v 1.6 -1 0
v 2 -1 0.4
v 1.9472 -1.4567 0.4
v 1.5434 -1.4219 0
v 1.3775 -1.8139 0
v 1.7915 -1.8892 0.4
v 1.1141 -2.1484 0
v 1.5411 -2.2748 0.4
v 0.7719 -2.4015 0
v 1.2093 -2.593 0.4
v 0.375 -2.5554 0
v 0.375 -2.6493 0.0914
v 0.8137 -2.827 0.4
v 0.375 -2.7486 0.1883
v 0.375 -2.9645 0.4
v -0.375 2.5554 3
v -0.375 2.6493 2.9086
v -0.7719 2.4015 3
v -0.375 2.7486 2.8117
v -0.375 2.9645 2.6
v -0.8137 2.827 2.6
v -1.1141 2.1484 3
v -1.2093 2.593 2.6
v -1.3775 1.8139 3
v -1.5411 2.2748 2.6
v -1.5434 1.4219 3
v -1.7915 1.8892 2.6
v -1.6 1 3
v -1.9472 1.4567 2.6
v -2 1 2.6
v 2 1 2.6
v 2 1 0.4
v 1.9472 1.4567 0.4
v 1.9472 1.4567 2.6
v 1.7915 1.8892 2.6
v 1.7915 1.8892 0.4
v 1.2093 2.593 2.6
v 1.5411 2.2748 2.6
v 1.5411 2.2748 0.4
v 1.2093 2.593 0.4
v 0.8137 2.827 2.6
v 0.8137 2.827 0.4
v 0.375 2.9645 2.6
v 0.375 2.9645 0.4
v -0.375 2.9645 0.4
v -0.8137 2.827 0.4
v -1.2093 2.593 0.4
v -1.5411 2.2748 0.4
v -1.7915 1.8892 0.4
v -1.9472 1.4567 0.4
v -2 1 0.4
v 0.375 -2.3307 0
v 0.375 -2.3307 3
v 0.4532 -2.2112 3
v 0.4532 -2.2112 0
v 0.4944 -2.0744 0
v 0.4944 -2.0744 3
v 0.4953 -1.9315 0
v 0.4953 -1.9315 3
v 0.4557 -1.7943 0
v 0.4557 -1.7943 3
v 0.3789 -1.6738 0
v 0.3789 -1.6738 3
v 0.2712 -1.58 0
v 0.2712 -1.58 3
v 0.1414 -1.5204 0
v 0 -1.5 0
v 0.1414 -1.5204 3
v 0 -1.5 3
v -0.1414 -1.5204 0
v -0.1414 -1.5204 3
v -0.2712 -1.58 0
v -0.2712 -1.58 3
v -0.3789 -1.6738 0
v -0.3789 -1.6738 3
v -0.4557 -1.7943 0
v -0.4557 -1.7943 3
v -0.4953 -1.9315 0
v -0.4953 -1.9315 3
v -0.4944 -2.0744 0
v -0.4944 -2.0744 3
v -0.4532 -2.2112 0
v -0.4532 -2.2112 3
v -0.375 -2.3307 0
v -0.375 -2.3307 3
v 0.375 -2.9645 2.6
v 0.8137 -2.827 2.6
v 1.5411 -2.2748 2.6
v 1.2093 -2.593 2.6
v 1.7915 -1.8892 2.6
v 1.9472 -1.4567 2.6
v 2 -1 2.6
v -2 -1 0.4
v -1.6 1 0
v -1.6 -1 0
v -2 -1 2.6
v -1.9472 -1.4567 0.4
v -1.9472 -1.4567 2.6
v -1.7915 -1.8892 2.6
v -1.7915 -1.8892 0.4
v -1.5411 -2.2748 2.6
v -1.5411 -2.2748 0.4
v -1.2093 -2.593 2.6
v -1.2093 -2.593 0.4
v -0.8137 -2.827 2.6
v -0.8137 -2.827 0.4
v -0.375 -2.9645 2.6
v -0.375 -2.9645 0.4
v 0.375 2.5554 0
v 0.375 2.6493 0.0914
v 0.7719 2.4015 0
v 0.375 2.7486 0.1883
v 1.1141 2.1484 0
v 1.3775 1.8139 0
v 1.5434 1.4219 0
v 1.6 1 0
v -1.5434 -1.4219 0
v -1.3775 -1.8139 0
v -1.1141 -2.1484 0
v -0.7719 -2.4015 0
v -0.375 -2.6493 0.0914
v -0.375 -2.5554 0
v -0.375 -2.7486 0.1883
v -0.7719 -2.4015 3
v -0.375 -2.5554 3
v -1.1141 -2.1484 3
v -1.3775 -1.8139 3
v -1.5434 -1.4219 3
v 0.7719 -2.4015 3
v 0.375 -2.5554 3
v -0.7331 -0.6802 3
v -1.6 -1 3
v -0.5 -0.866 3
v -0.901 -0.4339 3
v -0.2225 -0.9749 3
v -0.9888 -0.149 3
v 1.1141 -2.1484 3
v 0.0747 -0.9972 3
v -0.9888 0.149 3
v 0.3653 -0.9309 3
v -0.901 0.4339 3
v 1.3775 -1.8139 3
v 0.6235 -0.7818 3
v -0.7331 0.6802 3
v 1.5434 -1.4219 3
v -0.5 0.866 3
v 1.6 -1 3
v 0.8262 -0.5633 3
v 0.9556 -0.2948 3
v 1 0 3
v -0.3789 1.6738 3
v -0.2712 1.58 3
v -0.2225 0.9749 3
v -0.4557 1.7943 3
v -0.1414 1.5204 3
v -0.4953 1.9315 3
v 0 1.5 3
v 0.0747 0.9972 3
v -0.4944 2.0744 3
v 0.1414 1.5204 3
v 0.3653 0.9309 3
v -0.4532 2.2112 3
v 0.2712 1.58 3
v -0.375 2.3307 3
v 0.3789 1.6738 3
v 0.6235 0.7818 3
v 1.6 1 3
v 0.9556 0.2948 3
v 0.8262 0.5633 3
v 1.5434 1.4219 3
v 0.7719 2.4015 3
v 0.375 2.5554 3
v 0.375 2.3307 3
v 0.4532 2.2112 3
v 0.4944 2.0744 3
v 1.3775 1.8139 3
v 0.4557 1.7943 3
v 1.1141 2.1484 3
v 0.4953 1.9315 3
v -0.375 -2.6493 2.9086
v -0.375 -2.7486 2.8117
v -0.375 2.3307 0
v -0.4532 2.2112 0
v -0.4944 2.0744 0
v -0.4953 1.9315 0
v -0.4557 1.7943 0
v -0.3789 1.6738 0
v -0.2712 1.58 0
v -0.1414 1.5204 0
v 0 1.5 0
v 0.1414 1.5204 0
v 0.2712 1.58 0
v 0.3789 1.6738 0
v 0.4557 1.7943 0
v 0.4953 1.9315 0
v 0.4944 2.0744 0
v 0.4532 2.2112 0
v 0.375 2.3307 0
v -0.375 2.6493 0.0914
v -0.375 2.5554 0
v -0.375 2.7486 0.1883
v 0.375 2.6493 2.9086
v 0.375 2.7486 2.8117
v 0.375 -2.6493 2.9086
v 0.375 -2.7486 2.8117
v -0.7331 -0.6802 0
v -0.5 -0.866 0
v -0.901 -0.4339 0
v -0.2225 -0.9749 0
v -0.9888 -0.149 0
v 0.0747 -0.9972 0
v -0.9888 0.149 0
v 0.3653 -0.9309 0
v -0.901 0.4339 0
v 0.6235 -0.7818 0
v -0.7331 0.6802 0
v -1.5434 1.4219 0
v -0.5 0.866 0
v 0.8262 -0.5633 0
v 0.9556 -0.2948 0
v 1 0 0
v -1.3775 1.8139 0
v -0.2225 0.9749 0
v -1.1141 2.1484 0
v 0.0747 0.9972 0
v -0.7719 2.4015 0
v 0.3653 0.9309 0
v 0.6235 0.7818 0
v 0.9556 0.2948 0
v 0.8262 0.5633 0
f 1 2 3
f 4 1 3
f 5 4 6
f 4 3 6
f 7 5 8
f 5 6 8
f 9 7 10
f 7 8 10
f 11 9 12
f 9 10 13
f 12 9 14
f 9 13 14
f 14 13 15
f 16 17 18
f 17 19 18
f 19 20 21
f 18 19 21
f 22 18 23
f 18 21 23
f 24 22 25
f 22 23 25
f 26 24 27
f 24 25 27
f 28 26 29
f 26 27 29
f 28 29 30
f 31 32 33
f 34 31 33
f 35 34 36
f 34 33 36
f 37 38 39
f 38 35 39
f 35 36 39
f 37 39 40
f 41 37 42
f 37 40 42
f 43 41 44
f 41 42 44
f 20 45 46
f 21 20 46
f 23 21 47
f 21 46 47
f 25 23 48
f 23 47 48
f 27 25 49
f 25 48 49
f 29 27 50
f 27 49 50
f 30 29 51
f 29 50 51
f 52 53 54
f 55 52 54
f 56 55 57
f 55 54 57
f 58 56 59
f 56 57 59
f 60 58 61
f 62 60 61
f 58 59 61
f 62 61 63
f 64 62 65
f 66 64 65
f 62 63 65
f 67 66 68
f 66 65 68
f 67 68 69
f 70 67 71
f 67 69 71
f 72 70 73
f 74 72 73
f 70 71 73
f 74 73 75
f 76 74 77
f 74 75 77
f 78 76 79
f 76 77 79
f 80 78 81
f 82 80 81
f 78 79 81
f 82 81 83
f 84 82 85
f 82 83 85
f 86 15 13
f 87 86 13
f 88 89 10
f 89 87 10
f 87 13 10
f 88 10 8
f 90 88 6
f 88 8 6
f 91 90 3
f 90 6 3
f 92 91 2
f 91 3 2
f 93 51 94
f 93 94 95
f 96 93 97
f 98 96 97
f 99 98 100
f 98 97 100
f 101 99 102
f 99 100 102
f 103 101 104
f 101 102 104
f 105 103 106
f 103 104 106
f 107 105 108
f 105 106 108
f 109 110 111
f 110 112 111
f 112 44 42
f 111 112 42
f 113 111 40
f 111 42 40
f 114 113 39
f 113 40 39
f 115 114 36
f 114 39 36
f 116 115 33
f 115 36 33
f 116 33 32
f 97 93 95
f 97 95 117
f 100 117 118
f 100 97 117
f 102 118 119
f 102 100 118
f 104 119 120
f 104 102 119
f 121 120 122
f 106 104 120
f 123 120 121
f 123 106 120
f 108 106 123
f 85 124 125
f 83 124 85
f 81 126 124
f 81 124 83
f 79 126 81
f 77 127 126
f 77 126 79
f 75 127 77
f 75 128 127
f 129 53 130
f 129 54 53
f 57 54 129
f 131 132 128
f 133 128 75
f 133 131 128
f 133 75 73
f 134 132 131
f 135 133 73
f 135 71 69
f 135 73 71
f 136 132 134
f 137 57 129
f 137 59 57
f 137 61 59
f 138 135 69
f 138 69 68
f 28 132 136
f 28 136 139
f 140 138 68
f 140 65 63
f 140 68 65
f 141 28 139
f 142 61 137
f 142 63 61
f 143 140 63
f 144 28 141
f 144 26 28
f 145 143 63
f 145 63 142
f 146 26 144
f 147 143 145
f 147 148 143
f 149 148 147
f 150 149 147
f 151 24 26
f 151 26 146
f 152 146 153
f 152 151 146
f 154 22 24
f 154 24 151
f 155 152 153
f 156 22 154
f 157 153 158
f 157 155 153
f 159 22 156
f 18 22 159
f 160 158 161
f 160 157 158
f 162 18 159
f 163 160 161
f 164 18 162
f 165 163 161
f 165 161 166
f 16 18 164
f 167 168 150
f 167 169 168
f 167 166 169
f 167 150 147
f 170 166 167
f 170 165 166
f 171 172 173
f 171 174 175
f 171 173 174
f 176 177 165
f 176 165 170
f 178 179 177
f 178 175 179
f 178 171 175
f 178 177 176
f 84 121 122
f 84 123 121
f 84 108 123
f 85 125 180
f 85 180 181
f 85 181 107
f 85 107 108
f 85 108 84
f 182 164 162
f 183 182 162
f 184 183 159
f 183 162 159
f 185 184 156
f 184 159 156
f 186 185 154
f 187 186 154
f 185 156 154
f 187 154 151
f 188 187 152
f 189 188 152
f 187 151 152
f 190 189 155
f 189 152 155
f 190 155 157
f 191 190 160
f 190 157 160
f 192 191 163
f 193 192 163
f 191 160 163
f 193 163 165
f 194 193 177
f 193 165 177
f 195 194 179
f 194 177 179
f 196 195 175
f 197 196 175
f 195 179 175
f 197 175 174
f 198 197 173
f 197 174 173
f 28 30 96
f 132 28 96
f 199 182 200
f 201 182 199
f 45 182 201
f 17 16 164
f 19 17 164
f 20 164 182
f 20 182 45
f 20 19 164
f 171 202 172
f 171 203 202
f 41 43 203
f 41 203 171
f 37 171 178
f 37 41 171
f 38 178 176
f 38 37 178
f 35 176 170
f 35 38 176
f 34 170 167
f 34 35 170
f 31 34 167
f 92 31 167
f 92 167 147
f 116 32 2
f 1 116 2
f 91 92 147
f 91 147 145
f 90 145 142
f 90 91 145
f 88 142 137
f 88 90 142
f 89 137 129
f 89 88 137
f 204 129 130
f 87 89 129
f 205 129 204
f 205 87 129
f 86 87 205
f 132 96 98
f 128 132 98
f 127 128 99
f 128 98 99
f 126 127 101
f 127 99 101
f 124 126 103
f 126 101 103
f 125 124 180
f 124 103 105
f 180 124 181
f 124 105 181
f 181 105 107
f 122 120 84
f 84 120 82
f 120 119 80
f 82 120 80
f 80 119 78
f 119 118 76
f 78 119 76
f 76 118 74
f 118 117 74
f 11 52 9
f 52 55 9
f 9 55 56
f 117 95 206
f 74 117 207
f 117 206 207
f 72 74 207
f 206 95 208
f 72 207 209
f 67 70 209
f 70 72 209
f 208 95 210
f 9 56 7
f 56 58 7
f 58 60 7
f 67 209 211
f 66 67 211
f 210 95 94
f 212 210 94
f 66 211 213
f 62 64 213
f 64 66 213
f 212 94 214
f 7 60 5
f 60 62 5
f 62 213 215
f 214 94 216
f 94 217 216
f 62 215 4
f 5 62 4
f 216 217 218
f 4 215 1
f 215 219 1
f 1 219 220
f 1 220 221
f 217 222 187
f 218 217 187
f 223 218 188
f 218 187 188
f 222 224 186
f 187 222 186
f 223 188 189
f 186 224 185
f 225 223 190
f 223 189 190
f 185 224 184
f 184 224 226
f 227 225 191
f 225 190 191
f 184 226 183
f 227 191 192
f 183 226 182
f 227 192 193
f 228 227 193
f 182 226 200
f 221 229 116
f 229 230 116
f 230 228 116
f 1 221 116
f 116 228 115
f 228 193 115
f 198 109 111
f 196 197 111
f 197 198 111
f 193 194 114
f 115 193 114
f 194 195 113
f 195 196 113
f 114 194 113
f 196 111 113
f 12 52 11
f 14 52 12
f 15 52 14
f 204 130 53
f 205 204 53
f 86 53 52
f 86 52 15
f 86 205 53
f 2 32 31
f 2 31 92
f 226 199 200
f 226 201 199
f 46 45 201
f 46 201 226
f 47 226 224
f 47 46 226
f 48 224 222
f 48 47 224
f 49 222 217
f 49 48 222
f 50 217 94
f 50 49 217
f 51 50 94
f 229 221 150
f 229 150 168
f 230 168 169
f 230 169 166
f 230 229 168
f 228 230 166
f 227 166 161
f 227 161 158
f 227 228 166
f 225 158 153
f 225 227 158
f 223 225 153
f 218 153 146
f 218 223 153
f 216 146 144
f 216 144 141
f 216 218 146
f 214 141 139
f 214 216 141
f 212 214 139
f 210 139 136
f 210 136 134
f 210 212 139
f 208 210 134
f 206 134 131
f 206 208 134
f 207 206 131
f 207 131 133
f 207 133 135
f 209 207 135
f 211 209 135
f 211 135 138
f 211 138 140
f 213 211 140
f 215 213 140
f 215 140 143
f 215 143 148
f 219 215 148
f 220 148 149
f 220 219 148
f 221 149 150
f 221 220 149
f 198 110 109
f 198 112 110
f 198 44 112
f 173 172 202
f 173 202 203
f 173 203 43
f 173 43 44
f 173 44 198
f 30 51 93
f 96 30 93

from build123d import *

# Parameters (mm, degrees)
SKETCH_R           = 1
PAD_DEPTH          = 3
POCKET_DEPTH       = 18.621499
POLARPATTERN_COUNT = 2
CHAMFER_SIZE       = 0.4


with BuildPart() as part:
    # Sketch (on XY_Plane of Origin) → Pad (new body)
    with BuildSketch(Plane.XY):
        with BuildLine():
            ThreePointArc((2, 1), (0, 3), (-2, 1))
            Line((-2, 1), (-2, -1))
            ThreePointArc((-2, -1), (0, -3), (2, -1))
            Line((2, 1), (2, -1))
        make_face()
        Circle(SKETCH_R, mode=Mode.SUBTRACT)
    extrude(amount=PAD_DEPTH)

    # Sketch001 (on Face7 of Pad) → Pocket (cut, through all)
    with BuildSketch(Plane.XY.offset(3)):
        with BuildLine():
            ThreePointArc((-0.375, 2.330719), (0, 1.5), (0.375, 2.330719))
            Line((0.375, 4.330719), (0.375, 2.330719))
            Line((-0.375, 4.330719), (0.375, 4.330719))
            Line((-0.375, 2.330719), (-0.375, 4.330719))
        make_face()
    pocket = extrude(amount=-POCKET_DEPTH, mode=Mode.SUBTRACT)

    # PolarPattern: Pocket ×2 about axis
    polarpattern_axis = Axis((0, 0, 0), (0, 0, 1))
    for i in range(1, POLARPATTERN_COUNT):
        add(pocket.rotate(polarpattern_axis, i * 360 / POLARPATTERN_COUNT), mode=Mode.SUBTRACT)

    # Chamfer
    chamfer_edges = [part.edges().sort_by_distance(p)[0] for p in [
        (-2, 0, 0),
        (-2, 0, 3),
        (2, 0, 0),
        (2, 0, 3),
    ]]
    chamfer(chamfer_edges, length=CHAMFER_SIZE)


solid = part.part
